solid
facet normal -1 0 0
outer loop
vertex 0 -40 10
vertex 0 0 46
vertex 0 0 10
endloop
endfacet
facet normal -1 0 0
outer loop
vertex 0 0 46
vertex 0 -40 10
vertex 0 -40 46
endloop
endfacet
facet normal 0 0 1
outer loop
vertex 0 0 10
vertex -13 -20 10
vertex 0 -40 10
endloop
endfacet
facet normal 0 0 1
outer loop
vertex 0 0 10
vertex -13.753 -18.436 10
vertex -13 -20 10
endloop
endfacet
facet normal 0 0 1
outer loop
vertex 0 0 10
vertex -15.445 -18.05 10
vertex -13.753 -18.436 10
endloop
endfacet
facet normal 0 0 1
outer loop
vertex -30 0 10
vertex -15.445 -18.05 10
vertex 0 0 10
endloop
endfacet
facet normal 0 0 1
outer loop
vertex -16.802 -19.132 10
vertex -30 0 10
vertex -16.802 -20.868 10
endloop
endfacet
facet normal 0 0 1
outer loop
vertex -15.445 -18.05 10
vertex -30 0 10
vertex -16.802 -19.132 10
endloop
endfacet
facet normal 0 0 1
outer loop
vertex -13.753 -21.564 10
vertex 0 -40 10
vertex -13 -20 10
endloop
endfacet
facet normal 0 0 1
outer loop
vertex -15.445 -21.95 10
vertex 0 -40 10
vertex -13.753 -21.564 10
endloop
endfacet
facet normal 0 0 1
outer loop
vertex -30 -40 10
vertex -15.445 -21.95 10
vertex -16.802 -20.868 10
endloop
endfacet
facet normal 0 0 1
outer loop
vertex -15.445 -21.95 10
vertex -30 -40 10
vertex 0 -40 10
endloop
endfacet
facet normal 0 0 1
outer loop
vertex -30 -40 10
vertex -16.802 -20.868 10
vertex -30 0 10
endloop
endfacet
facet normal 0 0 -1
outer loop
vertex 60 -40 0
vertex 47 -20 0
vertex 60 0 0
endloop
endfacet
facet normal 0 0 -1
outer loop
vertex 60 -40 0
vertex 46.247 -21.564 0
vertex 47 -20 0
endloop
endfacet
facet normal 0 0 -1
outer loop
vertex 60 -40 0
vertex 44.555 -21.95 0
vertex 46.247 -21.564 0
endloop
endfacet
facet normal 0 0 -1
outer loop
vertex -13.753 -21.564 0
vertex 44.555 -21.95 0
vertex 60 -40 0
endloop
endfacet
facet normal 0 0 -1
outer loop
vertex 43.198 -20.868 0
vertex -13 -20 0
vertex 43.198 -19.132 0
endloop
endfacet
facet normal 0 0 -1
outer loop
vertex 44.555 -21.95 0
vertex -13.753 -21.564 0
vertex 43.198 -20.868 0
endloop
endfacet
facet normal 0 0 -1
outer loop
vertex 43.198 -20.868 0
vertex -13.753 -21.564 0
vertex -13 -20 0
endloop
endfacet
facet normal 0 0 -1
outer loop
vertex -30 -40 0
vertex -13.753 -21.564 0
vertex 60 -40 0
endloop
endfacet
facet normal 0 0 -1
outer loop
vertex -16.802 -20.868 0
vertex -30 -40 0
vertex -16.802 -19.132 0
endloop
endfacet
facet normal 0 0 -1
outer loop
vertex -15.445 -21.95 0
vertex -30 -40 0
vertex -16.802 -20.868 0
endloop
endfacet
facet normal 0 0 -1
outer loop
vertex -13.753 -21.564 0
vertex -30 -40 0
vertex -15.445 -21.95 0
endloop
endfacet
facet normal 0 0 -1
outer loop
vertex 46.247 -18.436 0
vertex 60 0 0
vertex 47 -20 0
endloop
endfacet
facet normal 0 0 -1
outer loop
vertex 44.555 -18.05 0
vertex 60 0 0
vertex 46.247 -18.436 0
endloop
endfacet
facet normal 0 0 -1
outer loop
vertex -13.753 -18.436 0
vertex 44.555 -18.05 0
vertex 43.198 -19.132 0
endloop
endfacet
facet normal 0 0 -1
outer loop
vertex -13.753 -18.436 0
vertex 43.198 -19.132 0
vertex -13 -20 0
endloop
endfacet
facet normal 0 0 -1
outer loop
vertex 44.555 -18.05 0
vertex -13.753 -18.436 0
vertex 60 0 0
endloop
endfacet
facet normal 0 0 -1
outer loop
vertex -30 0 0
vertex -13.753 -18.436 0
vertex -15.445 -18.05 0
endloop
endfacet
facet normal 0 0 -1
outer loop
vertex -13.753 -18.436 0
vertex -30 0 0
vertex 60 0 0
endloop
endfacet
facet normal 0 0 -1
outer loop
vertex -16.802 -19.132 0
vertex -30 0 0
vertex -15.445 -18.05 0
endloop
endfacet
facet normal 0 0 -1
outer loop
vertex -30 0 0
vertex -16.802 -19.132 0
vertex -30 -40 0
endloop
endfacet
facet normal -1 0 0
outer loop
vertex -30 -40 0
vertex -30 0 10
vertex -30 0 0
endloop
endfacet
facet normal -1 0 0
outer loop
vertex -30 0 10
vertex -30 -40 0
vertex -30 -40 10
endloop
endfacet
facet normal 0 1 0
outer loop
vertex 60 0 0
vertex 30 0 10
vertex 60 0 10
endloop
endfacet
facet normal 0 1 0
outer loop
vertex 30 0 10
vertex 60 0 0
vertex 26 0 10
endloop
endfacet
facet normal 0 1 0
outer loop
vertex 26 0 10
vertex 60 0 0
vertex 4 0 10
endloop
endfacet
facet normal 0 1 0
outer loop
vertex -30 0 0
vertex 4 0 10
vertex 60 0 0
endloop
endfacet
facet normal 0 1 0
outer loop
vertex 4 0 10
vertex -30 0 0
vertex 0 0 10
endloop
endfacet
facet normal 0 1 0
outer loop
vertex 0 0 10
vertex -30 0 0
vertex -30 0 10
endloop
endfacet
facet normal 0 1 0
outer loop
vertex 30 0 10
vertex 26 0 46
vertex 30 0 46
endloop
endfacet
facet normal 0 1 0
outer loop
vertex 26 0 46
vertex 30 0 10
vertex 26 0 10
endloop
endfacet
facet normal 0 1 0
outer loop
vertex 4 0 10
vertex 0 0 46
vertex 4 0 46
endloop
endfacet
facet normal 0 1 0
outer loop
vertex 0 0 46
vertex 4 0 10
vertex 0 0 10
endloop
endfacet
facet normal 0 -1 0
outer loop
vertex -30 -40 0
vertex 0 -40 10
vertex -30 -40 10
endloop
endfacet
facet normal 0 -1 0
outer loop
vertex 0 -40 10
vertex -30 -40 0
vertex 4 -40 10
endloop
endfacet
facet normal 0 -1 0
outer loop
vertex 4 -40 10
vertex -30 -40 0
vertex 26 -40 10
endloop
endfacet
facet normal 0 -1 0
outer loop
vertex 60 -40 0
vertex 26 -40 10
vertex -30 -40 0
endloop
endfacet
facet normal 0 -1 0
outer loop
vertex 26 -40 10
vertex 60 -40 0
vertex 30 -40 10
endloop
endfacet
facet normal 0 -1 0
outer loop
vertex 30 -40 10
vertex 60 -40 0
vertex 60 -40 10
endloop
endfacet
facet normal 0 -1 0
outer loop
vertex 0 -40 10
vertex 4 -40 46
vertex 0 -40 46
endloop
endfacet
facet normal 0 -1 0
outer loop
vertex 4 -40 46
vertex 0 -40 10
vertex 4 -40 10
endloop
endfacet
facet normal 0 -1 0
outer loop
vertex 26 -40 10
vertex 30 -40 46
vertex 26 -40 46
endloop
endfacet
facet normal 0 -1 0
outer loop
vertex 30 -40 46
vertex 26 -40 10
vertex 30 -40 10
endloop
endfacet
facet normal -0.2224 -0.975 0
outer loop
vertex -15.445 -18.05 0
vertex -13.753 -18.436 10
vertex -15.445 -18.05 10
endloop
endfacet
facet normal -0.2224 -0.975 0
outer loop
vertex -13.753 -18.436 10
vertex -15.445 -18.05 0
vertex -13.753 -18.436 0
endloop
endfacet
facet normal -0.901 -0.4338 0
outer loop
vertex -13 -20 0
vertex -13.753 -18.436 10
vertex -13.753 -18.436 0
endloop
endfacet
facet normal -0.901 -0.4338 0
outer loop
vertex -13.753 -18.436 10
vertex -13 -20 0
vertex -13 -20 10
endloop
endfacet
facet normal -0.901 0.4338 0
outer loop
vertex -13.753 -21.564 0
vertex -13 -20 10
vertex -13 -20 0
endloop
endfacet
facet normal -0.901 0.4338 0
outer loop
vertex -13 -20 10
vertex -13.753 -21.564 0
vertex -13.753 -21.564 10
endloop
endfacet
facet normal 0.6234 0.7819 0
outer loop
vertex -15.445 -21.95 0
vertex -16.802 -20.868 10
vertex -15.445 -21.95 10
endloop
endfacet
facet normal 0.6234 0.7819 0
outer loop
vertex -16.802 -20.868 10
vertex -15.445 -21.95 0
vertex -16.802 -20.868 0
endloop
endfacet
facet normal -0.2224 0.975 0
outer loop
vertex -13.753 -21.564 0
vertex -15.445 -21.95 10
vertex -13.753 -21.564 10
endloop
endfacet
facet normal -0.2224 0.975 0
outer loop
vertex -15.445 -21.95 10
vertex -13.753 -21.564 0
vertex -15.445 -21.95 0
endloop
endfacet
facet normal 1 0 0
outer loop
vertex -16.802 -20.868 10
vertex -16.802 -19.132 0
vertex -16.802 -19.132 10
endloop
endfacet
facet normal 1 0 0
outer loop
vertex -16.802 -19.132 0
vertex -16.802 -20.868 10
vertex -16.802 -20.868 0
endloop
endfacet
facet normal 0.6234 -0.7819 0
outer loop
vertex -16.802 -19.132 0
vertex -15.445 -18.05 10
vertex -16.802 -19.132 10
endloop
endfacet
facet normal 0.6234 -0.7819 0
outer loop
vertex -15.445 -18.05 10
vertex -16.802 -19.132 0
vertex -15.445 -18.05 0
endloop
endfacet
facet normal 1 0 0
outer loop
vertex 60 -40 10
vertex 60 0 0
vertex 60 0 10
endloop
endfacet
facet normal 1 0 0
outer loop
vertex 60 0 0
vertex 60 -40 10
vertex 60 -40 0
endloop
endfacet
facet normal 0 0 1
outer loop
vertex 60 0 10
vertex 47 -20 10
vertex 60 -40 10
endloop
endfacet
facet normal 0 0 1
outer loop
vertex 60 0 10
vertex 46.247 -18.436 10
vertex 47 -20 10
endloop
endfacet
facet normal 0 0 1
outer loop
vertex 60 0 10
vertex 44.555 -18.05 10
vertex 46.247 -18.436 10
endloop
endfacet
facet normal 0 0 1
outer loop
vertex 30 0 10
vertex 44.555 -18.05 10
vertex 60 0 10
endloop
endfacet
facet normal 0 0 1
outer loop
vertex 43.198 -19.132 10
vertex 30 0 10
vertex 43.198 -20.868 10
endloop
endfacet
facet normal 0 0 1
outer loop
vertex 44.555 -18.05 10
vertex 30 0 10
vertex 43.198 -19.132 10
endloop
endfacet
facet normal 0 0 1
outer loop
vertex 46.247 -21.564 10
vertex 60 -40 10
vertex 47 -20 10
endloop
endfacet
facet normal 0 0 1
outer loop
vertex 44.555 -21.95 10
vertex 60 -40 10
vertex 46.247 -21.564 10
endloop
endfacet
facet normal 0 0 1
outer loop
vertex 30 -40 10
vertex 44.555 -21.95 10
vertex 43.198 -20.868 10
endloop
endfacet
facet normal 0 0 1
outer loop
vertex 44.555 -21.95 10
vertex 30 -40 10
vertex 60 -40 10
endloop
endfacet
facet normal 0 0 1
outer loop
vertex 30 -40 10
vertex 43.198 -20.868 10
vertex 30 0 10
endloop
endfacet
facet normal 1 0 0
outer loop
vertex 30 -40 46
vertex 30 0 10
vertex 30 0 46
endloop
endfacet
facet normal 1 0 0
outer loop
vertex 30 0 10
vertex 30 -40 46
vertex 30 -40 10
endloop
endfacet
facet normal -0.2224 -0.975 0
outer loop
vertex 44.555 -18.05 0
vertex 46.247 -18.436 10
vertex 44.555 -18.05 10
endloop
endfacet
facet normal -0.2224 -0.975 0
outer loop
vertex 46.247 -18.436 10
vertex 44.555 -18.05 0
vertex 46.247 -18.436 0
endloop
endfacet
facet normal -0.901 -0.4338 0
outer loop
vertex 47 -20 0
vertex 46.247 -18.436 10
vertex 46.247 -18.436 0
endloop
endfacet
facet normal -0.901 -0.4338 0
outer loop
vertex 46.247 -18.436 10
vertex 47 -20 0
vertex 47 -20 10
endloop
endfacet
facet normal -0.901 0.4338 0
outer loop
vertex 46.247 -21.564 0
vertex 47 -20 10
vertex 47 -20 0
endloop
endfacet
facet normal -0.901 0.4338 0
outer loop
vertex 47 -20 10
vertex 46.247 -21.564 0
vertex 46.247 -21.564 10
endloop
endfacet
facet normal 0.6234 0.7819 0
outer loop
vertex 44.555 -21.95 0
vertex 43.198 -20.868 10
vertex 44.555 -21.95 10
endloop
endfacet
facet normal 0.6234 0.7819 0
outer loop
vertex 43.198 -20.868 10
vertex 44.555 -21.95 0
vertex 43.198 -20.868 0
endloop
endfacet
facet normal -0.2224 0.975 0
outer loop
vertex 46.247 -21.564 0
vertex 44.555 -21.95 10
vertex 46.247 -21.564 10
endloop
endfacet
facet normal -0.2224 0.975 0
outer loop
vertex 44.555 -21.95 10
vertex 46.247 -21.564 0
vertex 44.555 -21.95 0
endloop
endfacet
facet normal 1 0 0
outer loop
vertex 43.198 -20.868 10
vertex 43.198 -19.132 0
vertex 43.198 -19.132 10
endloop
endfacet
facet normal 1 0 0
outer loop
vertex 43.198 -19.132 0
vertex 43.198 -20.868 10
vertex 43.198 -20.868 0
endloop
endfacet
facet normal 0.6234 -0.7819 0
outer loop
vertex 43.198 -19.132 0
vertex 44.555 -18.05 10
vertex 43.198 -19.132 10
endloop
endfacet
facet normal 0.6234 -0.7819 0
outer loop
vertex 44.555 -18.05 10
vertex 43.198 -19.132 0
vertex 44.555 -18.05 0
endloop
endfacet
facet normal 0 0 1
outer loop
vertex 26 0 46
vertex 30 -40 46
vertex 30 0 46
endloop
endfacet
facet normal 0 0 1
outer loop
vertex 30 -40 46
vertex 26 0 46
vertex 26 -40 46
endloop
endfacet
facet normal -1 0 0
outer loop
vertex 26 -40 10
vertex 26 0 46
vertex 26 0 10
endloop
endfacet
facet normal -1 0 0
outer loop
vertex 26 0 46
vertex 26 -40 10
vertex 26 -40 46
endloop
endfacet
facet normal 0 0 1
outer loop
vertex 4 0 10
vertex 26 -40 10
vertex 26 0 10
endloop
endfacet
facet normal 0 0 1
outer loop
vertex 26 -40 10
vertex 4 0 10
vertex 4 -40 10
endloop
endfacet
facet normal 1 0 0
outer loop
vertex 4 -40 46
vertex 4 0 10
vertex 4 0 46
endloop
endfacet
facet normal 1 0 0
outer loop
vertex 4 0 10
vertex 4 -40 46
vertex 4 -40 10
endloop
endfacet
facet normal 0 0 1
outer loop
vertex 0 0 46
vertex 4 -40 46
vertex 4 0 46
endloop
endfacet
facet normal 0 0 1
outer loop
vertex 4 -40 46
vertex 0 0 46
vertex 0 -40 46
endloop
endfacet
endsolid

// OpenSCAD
// file: fixation.scad
module fixation() {
    difference(){
        translate([-30,-40,0])
            cube([30,40,10]);
        translate([-15,-20,-1])
            cylinder(20,2,2);
        
    }
    difference(){
        translate([30,-40,0])
            cube([30,40,10]);
        translate([45,-20,-1])
            cylinder(20,2,2);
    }
   
}
// main file
include <fixation.scad>

rotate([90,0,0])
    linear_extrude (height=40, $fn = 200)
        import (file="clips.dxf", layer="6-7", $fn=200);

fixation();
